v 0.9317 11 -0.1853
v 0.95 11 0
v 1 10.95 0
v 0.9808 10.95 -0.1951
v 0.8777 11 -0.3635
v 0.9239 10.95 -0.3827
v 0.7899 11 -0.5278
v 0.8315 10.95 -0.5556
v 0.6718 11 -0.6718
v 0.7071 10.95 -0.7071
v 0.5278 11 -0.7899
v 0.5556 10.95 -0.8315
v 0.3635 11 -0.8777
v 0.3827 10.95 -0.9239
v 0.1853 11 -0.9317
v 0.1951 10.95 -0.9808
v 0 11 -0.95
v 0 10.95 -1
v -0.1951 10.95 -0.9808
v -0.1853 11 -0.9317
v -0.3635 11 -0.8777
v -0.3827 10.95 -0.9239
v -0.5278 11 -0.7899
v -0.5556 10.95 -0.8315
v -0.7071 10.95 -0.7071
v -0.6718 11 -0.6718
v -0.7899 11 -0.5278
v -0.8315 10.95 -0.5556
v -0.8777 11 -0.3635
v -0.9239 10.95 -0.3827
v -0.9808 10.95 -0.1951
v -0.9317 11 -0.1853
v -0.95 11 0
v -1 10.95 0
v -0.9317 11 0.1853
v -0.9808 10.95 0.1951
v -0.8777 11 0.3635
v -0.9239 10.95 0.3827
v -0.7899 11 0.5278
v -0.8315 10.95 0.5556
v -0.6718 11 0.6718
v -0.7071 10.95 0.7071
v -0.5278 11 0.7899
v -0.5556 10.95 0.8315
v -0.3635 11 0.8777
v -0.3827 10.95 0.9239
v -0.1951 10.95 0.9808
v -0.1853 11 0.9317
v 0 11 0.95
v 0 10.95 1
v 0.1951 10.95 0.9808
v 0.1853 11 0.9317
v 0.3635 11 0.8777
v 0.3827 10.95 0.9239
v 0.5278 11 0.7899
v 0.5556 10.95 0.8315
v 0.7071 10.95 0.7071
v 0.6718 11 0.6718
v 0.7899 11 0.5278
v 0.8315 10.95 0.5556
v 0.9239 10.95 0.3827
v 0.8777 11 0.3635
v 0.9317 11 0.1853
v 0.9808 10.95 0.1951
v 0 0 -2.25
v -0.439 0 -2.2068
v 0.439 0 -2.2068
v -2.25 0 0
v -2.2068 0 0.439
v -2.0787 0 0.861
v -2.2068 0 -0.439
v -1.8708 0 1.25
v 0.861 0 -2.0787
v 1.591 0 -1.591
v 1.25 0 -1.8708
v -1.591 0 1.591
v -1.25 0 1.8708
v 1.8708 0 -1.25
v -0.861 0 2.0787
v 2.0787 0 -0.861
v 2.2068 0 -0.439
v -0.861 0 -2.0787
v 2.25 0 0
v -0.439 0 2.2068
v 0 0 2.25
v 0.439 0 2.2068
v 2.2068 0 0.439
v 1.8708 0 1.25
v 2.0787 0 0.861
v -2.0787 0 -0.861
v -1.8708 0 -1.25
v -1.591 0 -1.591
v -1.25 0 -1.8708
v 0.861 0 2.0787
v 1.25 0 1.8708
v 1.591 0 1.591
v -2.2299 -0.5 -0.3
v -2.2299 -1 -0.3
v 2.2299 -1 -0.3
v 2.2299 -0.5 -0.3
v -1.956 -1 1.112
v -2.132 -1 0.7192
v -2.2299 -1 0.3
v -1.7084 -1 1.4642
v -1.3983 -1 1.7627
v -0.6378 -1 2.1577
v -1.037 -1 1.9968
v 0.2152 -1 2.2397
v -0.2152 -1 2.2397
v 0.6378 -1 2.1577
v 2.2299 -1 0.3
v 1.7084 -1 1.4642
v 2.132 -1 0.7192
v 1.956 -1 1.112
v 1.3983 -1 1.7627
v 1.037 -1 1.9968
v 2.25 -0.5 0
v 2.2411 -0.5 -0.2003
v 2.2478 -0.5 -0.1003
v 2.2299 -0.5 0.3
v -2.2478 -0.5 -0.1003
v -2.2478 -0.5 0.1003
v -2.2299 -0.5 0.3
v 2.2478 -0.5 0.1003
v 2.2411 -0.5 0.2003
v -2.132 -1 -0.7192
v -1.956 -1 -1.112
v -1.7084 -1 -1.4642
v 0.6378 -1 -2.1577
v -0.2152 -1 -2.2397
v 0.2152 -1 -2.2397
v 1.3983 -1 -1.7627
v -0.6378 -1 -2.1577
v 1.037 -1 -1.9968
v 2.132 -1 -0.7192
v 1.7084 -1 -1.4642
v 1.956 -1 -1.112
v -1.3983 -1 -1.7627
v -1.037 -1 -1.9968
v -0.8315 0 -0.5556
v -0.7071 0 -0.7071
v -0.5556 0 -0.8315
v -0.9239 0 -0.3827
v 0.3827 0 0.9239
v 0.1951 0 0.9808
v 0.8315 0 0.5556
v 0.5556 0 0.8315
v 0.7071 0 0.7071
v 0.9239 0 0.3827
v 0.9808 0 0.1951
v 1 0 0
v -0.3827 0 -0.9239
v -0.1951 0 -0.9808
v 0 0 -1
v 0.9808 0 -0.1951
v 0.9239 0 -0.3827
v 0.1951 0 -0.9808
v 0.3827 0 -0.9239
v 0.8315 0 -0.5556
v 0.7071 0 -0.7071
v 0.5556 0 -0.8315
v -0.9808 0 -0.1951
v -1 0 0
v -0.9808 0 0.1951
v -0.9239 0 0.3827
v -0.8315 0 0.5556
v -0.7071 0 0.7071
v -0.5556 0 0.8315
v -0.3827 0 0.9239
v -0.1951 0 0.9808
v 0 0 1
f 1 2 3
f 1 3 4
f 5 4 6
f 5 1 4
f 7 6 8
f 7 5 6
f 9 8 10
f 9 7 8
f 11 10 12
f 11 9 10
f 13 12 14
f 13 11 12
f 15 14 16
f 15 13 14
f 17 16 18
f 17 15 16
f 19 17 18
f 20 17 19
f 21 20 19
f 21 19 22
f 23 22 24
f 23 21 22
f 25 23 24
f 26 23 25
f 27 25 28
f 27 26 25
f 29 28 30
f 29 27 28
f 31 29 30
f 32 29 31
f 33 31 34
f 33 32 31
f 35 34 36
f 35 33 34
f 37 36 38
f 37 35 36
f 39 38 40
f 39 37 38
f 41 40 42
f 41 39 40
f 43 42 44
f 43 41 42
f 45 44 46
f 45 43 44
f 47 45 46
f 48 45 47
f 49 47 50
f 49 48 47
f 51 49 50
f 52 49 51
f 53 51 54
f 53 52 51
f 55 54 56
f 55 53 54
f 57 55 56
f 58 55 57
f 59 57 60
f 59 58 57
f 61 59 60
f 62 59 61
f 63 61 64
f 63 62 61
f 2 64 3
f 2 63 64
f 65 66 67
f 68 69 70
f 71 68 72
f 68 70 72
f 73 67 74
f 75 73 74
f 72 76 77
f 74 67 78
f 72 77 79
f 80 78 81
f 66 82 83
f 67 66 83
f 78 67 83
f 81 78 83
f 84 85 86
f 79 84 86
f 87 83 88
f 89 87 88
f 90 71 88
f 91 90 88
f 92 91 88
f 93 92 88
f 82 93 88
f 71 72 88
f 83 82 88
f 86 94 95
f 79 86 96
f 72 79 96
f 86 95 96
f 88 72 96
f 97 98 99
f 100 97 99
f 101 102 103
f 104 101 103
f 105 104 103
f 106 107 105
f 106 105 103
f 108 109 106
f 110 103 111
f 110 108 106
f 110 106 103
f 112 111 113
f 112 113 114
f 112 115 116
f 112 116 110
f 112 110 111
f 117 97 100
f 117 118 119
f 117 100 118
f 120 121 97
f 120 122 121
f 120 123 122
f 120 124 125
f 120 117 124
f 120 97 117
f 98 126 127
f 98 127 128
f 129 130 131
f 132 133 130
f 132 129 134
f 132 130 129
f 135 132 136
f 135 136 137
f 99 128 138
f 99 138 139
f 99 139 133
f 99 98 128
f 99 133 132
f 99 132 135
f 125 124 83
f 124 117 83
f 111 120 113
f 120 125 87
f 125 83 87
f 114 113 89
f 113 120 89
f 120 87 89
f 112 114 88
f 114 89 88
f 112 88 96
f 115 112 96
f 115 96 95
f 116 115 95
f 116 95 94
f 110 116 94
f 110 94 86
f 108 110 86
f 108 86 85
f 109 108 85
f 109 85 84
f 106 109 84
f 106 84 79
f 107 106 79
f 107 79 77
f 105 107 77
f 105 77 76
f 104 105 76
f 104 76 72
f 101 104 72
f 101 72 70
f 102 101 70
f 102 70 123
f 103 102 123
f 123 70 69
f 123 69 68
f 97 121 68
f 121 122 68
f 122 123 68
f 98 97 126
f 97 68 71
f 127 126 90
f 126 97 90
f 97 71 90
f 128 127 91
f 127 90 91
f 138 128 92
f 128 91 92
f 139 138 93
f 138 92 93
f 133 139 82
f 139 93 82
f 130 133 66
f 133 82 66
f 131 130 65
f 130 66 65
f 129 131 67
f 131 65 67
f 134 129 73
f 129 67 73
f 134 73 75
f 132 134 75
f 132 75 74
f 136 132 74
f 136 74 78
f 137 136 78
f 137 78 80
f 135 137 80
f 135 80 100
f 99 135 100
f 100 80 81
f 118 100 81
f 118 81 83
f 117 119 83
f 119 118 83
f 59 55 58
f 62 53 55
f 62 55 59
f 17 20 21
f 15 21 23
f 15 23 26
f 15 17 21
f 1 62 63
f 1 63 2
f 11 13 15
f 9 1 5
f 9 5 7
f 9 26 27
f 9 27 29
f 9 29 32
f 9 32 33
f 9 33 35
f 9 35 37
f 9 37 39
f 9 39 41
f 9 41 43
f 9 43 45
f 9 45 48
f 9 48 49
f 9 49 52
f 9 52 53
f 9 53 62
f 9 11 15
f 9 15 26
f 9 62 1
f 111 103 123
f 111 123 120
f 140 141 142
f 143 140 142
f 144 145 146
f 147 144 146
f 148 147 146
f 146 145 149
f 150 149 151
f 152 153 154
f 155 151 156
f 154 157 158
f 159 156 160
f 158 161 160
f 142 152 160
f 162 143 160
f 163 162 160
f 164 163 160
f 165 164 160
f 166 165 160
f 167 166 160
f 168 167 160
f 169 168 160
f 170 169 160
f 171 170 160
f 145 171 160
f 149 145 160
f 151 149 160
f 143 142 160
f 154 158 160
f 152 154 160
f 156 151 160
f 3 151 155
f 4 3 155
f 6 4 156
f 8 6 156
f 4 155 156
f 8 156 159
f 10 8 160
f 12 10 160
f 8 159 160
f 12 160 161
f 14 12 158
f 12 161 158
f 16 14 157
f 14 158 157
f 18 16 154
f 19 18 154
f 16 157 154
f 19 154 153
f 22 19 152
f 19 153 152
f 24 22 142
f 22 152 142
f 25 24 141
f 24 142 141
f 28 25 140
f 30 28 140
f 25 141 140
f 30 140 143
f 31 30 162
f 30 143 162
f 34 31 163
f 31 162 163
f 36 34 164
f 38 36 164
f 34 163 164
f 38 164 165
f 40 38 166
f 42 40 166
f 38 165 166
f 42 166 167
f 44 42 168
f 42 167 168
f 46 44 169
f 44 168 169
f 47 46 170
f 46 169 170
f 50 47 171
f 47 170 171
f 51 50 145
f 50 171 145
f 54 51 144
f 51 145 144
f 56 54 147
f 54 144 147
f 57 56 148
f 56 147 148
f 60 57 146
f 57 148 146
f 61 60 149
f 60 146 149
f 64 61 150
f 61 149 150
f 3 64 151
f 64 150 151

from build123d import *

# Parameters (mm, degrees)
SKETCH1_R           = 1
BOSS_EXTRUDE1_DEPTH = 11
SKETCH2_R           = 2.25
BOSS_EXTRUDE2_DEPTH = 1
SKETCH3_W           = 8.196351728
SKETCH3_H           = 0.6
CUT_EXTRUDE1_DEPTH  = 0.5
CHAMFER1_SIZE       = 0.05


with BuildPart() as part:
    # Sketch1 → Boss-Extrude1 (new body)
    with BuildSketch(Plane(origin=(0, 0, 0), x_dir=(1, 0, 0), z_dir=(0, 1, 0))):
        Circle(SKETCH1_R)
    extrude(amount=BOSS_EXTRUDE1_DEPTH)

    # Chamfer1
    chamfer1_edges = [part.edges().sort_by_distance(p)[0] for p in [
        (-1, 11, 0),
    ]]
    chamfer(chamfer1_edges, length=CHAMFER1_SIZE)


with BuildPart() as body_2:
    # Sketch2 → Boss-Extrude2 (new body)
    with BuildSketch(Plane.XZ):
        Circle(SKETCH2_R)
    extrude(amount=BOSS_EXTRUDE2_DEPTH)

    # Sketch3 → Cut-Extrude1 (cut)
    with BuildSketch(Plane.XZ.offset(1)):
        Rectangle(SKETCH3_W, SKETCH3_H)
    extrude(amount=-CUT_EXTRUDE1_DEPTH, mode=Mode.SUBTRACT)


solid = Compound([part.part, body_2.part])
